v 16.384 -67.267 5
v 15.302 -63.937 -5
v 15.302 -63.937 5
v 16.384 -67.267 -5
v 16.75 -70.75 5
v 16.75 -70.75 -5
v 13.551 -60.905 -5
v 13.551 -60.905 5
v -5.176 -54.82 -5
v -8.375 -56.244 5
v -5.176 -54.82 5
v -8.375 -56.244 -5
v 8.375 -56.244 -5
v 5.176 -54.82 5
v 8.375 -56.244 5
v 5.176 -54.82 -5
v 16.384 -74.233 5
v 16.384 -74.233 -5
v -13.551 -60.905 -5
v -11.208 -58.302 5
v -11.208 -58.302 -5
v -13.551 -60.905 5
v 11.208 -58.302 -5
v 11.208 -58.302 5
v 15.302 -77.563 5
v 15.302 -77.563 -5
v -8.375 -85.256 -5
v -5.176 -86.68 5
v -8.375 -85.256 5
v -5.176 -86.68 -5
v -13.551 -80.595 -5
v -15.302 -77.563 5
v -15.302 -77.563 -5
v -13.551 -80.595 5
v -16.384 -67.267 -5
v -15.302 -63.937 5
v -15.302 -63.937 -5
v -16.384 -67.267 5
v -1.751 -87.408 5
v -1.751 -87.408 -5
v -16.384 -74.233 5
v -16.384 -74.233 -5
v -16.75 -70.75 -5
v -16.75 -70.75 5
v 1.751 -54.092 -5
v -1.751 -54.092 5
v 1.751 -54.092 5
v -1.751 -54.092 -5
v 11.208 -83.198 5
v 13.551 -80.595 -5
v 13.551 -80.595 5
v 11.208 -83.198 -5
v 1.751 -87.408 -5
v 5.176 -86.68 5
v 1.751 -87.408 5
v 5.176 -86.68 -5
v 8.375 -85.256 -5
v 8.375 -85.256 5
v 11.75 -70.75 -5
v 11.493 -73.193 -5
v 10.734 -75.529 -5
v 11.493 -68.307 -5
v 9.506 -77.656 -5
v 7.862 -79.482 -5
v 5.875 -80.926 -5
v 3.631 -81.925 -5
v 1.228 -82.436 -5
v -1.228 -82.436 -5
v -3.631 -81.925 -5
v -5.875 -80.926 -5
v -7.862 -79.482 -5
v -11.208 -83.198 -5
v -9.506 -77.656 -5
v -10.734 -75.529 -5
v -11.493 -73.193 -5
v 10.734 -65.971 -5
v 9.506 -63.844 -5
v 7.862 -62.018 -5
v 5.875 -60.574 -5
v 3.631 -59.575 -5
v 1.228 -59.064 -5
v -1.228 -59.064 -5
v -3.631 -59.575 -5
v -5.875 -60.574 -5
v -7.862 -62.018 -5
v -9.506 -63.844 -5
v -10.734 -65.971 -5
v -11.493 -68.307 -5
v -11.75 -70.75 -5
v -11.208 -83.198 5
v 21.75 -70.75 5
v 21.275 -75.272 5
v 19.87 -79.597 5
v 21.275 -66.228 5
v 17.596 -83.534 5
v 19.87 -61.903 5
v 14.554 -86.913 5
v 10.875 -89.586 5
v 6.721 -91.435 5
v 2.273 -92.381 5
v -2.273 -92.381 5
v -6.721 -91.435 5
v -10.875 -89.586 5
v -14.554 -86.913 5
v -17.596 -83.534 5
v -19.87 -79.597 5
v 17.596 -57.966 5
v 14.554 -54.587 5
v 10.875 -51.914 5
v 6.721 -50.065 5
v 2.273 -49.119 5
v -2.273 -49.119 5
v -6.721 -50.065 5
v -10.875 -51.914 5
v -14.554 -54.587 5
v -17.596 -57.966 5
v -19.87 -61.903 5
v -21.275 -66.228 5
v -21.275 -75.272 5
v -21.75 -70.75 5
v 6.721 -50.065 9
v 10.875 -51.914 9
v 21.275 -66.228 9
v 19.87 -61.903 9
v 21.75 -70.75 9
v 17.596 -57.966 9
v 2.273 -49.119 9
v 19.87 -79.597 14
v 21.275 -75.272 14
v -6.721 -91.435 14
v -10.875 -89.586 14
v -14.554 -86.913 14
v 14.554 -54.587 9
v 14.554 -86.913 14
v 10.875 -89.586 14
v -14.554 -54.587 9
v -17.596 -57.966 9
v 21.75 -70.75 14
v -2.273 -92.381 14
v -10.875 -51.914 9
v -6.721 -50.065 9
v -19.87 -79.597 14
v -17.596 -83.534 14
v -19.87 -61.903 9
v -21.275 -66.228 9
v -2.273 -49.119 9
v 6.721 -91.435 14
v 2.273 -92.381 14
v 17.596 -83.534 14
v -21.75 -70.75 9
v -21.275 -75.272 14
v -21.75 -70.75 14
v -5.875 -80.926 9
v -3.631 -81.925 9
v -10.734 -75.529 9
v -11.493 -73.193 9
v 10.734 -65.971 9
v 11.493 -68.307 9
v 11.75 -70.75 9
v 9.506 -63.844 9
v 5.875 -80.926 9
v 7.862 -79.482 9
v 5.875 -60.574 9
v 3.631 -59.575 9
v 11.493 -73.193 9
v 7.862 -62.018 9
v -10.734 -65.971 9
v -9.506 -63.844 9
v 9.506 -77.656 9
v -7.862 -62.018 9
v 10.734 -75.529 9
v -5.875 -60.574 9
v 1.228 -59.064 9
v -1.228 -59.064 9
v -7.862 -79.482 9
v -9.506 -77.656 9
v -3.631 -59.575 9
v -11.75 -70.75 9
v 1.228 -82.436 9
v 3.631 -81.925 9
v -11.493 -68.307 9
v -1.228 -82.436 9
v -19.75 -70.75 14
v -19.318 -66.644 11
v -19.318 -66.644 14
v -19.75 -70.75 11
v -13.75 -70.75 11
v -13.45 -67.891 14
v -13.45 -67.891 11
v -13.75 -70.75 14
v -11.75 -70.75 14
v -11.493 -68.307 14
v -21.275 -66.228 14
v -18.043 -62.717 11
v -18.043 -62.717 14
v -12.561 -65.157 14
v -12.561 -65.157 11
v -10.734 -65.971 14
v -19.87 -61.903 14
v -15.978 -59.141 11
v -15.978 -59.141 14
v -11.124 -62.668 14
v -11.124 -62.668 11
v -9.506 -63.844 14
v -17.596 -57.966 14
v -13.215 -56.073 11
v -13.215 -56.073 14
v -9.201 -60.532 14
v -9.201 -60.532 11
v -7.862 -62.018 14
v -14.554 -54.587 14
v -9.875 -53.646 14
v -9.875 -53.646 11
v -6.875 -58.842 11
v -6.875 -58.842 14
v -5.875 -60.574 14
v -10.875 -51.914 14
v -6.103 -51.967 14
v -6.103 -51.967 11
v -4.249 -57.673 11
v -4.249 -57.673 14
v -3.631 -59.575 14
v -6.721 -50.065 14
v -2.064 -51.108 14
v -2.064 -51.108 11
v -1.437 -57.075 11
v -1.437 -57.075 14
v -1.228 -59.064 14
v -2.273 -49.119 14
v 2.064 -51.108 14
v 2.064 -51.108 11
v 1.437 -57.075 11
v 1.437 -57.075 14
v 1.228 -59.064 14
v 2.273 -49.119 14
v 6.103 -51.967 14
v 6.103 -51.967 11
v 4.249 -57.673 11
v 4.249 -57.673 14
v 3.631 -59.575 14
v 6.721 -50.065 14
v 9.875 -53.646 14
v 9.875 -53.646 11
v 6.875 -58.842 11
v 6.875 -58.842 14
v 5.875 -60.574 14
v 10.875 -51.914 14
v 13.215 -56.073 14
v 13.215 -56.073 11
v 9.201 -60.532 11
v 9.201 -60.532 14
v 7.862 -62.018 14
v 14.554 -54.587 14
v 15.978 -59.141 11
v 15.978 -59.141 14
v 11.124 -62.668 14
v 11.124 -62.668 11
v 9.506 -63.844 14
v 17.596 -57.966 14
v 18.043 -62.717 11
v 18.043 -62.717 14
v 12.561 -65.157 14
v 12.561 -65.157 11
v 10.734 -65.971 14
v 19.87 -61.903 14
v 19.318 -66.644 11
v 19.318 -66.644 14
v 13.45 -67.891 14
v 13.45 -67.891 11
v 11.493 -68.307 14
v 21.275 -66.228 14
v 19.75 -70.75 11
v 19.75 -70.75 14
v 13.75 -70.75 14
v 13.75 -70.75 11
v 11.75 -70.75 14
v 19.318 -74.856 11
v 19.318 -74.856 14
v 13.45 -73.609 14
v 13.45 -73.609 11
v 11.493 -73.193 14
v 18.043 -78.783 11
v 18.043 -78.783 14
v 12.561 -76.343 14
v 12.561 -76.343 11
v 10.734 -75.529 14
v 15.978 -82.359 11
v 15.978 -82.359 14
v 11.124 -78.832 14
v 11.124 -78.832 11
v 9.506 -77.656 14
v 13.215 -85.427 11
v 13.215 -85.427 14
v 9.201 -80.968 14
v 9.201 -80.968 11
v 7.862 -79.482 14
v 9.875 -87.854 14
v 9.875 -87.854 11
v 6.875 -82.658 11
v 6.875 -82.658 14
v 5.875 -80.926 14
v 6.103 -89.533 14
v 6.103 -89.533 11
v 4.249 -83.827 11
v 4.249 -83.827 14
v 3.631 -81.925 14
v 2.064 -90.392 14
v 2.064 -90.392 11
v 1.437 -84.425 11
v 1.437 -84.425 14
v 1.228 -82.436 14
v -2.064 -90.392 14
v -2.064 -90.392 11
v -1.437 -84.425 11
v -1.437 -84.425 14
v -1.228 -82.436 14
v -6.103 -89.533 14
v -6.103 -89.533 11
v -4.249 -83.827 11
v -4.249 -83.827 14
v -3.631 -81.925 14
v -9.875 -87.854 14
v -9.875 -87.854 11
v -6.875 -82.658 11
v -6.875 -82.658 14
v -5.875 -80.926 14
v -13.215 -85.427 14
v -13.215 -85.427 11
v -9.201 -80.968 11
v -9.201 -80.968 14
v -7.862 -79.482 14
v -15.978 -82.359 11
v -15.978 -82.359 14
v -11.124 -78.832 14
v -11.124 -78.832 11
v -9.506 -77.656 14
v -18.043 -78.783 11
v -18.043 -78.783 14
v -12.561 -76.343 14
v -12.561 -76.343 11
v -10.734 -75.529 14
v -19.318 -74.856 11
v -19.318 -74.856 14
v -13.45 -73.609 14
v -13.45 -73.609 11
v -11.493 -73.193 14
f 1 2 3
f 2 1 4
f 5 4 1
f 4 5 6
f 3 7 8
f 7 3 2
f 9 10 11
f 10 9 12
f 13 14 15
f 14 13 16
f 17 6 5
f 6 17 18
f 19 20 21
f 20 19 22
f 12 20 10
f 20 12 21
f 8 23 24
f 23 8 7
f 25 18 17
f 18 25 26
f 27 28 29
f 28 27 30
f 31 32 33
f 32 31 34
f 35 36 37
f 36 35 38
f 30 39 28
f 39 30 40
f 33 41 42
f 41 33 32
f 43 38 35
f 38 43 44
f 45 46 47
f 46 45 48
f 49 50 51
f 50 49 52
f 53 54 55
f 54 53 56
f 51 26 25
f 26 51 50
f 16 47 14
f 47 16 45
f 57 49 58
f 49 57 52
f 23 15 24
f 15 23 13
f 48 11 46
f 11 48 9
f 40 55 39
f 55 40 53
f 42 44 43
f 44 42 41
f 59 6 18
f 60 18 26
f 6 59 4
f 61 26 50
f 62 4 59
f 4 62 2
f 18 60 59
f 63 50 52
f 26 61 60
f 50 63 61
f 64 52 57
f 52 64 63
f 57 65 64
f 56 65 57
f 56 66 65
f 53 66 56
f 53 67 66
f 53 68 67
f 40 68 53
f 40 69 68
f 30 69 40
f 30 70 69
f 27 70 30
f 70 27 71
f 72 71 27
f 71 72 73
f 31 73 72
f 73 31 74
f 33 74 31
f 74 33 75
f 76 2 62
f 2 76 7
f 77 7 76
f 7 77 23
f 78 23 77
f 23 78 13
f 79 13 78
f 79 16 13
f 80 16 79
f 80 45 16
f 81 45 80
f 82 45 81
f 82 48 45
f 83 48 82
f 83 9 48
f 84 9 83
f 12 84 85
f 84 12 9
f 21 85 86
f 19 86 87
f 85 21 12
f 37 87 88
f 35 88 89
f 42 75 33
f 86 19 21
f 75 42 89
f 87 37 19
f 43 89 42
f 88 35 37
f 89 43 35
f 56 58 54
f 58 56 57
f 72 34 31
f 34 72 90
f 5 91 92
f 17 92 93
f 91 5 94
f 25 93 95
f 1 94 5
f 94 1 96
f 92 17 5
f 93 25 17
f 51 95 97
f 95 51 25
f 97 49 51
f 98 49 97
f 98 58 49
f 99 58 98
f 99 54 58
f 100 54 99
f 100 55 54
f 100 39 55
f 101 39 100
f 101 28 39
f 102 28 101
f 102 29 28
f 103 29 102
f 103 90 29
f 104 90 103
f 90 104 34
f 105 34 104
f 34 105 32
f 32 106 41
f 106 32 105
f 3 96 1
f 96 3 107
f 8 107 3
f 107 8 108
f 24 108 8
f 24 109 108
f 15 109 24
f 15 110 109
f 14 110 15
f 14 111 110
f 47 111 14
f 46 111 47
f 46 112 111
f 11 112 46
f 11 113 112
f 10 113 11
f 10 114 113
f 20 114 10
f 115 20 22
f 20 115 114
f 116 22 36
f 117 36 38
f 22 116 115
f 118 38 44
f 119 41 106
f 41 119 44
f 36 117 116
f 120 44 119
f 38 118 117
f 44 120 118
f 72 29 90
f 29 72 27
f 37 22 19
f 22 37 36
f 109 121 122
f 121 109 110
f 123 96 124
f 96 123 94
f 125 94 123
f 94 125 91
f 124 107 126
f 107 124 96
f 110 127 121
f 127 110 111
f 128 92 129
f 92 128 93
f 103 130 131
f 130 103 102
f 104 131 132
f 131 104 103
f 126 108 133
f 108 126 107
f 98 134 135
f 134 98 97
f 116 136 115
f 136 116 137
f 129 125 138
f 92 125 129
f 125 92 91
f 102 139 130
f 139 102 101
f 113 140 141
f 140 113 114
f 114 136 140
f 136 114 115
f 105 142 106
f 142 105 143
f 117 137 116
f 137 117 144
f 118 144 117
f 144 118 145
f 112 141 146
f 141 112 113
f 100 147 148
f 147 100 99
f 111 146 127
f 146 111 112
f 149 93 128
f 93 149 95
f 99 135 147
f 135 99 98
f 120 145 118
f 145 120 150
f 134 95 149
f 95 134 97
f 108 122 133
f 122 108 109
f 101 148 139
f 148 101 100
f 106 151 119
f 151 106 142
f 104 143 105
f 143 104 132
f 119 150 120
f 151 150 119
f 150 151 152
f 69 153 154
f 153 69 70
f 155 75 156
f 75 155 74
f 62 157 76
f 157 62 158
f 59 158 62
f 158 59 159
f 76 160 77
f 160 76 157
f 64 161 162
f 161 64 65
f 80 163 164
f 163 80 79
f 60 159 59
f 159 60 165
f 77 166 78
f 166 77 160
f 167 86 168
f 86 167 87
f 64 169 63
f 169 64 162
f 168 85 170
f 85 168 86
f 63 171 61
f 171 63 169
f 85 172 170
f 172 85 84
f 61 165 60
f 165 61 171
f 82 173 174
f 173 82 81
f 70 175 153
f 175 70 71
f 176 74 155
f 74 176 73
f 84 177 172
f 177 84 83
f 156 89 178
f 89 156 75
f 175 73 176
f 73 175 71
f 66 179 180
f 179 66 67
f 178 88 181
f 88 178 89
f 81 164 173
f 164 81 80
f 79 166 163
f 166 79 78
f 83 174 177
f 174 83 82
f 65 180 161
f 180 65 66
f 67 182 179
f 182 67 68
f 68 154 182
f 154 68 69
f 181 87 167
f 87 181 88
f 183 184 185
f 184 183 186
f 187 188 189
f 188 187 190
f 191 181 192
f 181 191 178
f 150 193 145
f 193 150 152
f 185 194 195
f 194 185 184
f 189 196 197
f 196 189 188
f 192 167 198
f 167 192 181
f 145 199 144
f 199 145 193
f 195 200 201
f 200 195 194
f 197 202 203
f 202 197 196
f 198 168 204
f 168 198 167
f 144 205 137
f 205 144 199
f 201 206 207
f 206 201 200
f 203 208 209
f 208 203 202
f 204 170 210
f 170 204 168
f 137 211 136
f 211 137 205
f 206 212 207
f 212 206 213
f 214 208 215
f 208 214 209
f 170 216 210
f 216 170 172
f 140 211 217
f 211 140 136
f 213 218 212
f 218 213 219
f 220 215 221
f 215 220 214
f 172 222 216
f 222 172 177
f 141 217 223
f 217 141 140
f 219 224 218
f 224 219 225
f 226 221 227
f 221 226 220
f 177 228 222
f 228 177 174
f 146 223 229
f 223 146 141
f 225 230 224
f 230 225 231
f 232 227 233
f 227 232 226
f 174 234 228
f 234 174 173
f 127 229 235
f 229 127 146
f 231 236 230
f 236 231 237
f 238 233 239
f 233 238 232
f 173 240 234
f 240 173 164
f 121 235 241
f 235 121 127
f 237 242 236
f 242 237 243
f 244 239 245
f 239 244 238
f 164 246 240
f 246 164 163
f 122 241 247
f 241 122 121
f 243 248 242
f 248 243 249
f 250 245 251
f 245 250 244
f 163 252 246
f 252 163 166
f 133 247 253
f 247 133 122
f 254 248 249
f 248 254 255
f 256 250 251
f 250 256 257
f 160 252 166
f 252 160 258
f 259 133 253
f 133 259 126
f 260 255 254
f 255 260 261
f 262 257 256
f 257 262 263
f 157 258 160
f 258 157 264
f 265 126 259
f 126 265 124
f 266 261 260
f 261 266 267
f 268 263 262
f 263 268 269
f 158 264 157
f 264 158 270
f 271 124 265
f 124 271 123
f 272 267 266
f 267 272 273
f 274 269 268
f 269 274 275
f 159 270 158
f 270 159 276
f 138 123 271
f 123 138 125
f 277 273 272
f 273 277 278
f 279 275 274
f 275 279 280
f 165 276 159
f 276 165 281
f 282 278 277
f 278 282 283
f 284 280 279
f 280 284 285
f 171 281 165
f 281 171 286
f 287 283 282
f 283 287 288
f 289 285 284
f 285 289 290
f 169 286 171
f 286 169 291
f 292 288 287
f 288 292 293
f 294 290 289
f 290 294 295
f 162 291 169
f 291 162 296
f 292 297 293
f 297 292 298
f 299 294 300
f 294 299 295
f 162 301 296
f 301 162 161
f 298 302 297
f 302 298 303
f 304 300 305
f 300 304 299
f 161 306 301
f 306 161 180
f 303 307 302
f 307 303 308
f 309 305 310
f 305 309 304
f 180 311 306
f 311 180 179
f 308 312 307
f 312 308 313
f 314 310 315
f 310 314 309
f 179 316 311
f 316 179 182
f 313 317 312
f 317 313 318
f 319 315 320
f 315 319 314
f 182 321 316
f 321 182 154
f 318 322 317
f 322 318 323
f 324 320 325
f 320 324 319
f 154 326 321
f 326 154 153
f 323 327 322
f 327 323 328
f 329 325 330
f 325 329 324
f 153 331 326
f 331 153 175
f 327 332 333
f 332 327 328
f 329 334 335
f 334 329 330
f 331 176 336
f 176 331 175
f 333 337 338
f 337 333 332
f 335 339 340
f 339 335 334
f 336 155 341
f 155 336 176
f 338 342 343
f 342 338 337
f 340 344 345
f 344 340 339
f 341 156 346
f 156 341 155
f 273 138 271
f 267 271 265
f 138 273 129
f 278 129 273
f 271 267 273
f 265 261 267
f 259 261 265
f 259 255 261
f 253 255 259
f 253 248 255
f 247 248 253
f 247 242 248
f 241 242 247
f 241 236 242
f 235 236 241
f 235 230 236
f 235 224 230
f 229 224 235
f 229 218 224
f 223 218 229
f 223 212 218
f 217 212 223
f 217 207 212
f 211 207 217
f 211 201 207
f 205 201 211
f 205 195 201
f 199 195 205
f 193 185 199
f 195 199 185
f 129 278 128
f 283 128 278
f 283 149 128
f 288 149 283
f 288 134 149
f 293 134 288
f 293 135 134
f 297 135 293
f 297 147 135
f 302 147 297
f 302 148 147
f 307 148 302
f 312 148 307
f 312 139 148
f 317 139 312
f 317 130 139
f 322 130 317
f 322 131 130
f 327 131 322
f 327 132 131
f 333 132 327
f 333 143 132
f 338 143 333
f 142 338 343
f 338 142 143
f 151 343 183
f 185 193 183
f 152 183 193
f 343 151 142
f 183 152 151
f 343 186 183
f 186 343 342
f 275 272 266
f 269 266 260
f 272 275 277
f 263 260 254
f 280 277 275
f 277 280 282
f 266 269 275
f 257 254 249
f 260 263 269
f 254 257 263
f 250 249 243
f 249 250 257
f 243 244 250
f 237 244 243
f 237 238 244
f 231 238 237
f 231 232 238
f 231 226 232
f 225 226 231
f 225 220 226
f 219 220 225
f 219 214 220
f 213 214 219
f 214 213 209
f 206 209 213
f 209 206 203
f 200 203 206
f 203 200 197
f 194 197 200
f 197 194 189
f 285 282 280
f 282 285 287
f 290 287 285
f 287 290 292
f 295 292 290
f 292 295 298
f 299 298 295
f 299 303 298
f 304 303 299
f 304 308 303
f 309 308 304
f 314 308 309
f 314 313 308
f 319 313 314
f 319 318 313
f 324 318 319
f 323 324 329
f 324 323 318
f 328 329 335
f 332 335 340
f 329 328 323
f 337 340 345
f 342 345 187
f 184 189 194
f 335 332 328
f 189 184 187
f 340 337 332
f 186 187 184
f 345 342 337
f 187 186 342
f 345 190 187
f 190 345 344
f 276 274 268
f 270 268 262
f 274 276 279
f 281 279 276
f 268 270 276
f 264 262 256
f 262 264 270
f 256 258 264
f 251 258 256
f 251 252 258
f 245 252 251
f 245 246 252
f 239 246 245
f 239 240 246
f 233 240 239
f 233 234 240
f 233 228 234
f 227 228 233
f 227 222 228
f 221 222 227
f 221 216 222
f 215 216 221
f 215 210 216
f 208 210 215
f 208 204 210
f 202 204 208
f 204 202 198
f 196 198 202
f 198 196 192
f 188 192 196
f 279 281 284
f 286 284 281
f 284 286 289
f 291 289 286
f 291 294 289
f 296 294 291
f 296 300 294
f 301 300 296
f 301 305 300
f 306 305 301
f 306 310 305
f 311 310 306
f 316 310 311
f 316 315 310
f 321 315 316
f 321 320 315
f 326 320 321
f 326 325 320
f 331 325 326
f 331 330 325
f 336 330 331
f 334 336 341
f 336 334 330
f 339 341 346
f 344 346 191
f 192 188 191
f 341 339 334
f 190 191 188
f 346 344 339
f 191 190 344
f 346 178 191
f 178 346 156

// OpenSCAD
// file: hangon_clickin.scad
include <servo.scad>
include <parameters.scad>

//%back_holes();

module hangon(){
    //support
    mirror_copy([1,0,0])translate([hangon_support_distance,-hangon_support_length/2-(contact_delta/2)+5,-(5-(top_component_height*0.5))/2])
    cube([round(top_component_width*0.1),hangon_support_length+contact_delta,top_component_height*0.5], true);

    //base
    translate([0,shaft_center,0])
    difference(){
        cube([hangon_base_diameter,hangon_base_diameter,5], true);
        cylinder(10, hangon_base_diameter/2-5, hangon_base_diameter/2-5, true);
    }
}
// file: servo.scad
//parameters
servo_width = 12;
servo_length = 24;
servo_height = 24;
ex_length = 5;
ex_height = 4;
shaft_offset = 5;
shaft_radius = 5;
shaft_height = 5;

module mirror_copy(vec=[0,1,0]){
    children();
    mirror(vec)children();
}

module back_holes(){
    mirror_copy([1,0,0])translate([top_component_width/2-round((top_component_width*0.1)/2)-3,0,0])
    cube([round(top_component_width*0.15),back_component_length,top_component_height*0.6], true);    
}

module servo(){
    translate([0,0,servo_height/2])
    union(){
        //extrusion
        mirror_copy()
            translate([0,servo_length/2+ex_length/2,(servo_height/2)-ex_height/2])
                cube([servo_width, ex_length, ex_height], true);
        //shaft
        translate([0,-servo_length/2+shaft_radius,servo_height/2+shaft_height/2])
        cylinder(shaft_height, shaft_radius, shaft_radius, true);
        //base
        cube([servo_width, servo_length, servo_height], true);
    }
}
// file: bearing_holder.scad
include <servo.scad>
include <parameters.scad>
include <hangon_clickin.scad>

%hangon();
shaft_hole_width = hangon_base_diameter/2-5;
holder_width = shaft_hole_width-1;
holder_height = 10;
bearing_pit_width = holder_width+5;
bearing_pit_height = 4;
shaft_hole_radius = holder_width-5;
wall_width = 2;
wall_height = 5;
pit_width = 10;

translate([0,shaft_center,0])
union(){
    difference(){
        //base
        union(){
            //holder
            cylinder(holder_height, holder_width, holder_width, true);
            //bearing pit base
            translate([0,0,holder_height/2+bearing_pit_height/2])
            cylinder(bearing_pit_height, bearing_pit_width, bearing_pit_width, true);
        }
        //shaft hole
        translate([0,0,bearing_pit_height/2])
        cylinder(holder_height+bearing_pit_height, shaft_hole_radius, shaft_hole_radius, true);
    }
}
//bearing pit
translate([0,shaft_center,-(shaft_hole_radius-(holder_height/2+bearing_pit_height))])
rotate_extrude(angle = 360, convexity = 10){
    polygon(points=[[shaft_hole_radius,shaft_hole_radius], [shaft_hole_radius+pit_width, shaft_hole_radius], [shaft_hole_radius+pit_width, shaft_hole_radius+wall_height], [shaft_hole_radius+pit_width-wall_width,shaft_hole_radius+wall_height], [shaft_hole_radius+pit_width-wall_width,shaft_hole_radius+wall_width], [shaft_hole_radius+wall_width,shaft_hole_radius+wall_width], [shaft_hole_radius+wall_width,shaft_hole_radius+wall_height], [shaft_hole_radius,shaft_hole_radius+wall_height]]);
};
// file: parameters.scad
//parameters

//base
back_length = 10;
outer_width = 20;
outer_length = 36+back_length;
inner_width = 12;
inner_length = 25;
base_height = 6;
front_offset = round((outer_length-inner_length)/2)-4;
back_component_length = 10;
back_component_height = 100;
back_offset = outer_length/2+back_component_length/2;
top_component_height = 8;
top_component_width = 40;

//hangon
contact_delta = 50;
hangon_support_length = 8;
hangon_support_delta = 2.5;
hangon_support_distance = (top_component_width/2-round((top_component_width*0.1)/2)-hangon_support_delta);
shaft_center = (-hangon_support_length-((hangon_support_distance+10)/2))-contact_delta;
hangon_base_diameter = hangon_support_distance+30;

//fixture
top_part_diplacement = 8;
leg_width = 2;
clickon_height = 2;

//bearing_pit
shaft_hole_width = hangon_base_diameter/2-5;
holder_width = shaft_hole_width-1;
holder_height = 10;
bearing_pit_width = holder_width+5;
bearing_pit_height = 4;
shaft_hole_radius = holder_width-5;
wall_width = 2;
wall_height = 5;
pit_width = 10;

//bearing_disc
//disc_radius = shaft_hole_radius+pit_width;
disc_radius = 10;
disc_height = 4;
hole_length = (shaft_hole_radius*2)-2;
hole_width = 2;
shaft_raidus = (hole_length/2)*0.6;

//servo
servo_width = 12;
servo_length = 24;
servo_height = 24;
ex_length = 5;
ex_height = 4;
shaft_radius = 5;
shaft_height = 5;
shaft_offset = -servo_length/2+shaft_radius+3;

//ball bearings
ball_bearing_length = 8;
ball_bearing_height = 3;

//shaft
shaft_girth = shaft_raidus-(0.5/2);
shaft_pole_height = 60;
shaft_grip_height = 5;
shaft_fitting = 4;
pole_up_trans = back_component_height/2-(servo_height/2+shaft_height/2)+((servo_height+shaft_height)-shaft_pole_height/2)+shaft_fitting;
//lock_ex_width = hole_width*0.8;
lock_ex_width = 2;
//lock_ex_length = hole_length-0.5;
lock_ex_length = 2;
lock_ex_displacement = -17.6;

//shaft_grip
shaft_grip_radius = 12;



//complete 
bearing_delta = 4;
center_on_shaft = front_offset-shaft_offset;
// main file
include <parameters.scad>
include <bearing_holder.scad>

/*
translate([0,-shaft_center,0])
bearing_holder();
*/

module bearing_disc(){
    translate([0, 0, 0])
    difference(){
    union(){
        difference(){
            union(){
                //lock high 1
                translate([0,hole_width/2+1,0])
                cube([disc_radius,4,disc_height+1]);
                //lock low 1
                translate([0,-1,0])
                hull(){
                    translate([0,-hole_width*1.5,0])
                    cube([disc_radius,0.1,disc_height-1]);
                    translate([0,-hole_width/2,0])
                    cube([disc_radius,0.1,disc_height]);
                }
                //lock high 2
                rotate([0,0,180])
                translate([0,hole_width/2+1,0])
                cube([disc_radius,4,disc_height+1]);
                //lock low 2
                rotate([0,0,180])
                translate([0,-1,0])
                hull(){
                    translate([0,-hole_width*1.5,0])
                    cube([disc_radius,0.1,disc_height-1]);
                    translate([0,-hole_width/2,0])
                    cube([disc_radius,0.1,disc_height]);
                }
                //disc
                cylinder(disc_height,disc_radius,disc_radius, true);
            }
            //shaft hole
            cylinder(disc_height+10, shaft_raidus, shaft_raidus, true);
        }
    }
    difference(){
        cylinder(10,disc_radius+10,disc_radius+10, true);
        cylinder(10,disc_radius, disc_radius, true);
    }
}
}
